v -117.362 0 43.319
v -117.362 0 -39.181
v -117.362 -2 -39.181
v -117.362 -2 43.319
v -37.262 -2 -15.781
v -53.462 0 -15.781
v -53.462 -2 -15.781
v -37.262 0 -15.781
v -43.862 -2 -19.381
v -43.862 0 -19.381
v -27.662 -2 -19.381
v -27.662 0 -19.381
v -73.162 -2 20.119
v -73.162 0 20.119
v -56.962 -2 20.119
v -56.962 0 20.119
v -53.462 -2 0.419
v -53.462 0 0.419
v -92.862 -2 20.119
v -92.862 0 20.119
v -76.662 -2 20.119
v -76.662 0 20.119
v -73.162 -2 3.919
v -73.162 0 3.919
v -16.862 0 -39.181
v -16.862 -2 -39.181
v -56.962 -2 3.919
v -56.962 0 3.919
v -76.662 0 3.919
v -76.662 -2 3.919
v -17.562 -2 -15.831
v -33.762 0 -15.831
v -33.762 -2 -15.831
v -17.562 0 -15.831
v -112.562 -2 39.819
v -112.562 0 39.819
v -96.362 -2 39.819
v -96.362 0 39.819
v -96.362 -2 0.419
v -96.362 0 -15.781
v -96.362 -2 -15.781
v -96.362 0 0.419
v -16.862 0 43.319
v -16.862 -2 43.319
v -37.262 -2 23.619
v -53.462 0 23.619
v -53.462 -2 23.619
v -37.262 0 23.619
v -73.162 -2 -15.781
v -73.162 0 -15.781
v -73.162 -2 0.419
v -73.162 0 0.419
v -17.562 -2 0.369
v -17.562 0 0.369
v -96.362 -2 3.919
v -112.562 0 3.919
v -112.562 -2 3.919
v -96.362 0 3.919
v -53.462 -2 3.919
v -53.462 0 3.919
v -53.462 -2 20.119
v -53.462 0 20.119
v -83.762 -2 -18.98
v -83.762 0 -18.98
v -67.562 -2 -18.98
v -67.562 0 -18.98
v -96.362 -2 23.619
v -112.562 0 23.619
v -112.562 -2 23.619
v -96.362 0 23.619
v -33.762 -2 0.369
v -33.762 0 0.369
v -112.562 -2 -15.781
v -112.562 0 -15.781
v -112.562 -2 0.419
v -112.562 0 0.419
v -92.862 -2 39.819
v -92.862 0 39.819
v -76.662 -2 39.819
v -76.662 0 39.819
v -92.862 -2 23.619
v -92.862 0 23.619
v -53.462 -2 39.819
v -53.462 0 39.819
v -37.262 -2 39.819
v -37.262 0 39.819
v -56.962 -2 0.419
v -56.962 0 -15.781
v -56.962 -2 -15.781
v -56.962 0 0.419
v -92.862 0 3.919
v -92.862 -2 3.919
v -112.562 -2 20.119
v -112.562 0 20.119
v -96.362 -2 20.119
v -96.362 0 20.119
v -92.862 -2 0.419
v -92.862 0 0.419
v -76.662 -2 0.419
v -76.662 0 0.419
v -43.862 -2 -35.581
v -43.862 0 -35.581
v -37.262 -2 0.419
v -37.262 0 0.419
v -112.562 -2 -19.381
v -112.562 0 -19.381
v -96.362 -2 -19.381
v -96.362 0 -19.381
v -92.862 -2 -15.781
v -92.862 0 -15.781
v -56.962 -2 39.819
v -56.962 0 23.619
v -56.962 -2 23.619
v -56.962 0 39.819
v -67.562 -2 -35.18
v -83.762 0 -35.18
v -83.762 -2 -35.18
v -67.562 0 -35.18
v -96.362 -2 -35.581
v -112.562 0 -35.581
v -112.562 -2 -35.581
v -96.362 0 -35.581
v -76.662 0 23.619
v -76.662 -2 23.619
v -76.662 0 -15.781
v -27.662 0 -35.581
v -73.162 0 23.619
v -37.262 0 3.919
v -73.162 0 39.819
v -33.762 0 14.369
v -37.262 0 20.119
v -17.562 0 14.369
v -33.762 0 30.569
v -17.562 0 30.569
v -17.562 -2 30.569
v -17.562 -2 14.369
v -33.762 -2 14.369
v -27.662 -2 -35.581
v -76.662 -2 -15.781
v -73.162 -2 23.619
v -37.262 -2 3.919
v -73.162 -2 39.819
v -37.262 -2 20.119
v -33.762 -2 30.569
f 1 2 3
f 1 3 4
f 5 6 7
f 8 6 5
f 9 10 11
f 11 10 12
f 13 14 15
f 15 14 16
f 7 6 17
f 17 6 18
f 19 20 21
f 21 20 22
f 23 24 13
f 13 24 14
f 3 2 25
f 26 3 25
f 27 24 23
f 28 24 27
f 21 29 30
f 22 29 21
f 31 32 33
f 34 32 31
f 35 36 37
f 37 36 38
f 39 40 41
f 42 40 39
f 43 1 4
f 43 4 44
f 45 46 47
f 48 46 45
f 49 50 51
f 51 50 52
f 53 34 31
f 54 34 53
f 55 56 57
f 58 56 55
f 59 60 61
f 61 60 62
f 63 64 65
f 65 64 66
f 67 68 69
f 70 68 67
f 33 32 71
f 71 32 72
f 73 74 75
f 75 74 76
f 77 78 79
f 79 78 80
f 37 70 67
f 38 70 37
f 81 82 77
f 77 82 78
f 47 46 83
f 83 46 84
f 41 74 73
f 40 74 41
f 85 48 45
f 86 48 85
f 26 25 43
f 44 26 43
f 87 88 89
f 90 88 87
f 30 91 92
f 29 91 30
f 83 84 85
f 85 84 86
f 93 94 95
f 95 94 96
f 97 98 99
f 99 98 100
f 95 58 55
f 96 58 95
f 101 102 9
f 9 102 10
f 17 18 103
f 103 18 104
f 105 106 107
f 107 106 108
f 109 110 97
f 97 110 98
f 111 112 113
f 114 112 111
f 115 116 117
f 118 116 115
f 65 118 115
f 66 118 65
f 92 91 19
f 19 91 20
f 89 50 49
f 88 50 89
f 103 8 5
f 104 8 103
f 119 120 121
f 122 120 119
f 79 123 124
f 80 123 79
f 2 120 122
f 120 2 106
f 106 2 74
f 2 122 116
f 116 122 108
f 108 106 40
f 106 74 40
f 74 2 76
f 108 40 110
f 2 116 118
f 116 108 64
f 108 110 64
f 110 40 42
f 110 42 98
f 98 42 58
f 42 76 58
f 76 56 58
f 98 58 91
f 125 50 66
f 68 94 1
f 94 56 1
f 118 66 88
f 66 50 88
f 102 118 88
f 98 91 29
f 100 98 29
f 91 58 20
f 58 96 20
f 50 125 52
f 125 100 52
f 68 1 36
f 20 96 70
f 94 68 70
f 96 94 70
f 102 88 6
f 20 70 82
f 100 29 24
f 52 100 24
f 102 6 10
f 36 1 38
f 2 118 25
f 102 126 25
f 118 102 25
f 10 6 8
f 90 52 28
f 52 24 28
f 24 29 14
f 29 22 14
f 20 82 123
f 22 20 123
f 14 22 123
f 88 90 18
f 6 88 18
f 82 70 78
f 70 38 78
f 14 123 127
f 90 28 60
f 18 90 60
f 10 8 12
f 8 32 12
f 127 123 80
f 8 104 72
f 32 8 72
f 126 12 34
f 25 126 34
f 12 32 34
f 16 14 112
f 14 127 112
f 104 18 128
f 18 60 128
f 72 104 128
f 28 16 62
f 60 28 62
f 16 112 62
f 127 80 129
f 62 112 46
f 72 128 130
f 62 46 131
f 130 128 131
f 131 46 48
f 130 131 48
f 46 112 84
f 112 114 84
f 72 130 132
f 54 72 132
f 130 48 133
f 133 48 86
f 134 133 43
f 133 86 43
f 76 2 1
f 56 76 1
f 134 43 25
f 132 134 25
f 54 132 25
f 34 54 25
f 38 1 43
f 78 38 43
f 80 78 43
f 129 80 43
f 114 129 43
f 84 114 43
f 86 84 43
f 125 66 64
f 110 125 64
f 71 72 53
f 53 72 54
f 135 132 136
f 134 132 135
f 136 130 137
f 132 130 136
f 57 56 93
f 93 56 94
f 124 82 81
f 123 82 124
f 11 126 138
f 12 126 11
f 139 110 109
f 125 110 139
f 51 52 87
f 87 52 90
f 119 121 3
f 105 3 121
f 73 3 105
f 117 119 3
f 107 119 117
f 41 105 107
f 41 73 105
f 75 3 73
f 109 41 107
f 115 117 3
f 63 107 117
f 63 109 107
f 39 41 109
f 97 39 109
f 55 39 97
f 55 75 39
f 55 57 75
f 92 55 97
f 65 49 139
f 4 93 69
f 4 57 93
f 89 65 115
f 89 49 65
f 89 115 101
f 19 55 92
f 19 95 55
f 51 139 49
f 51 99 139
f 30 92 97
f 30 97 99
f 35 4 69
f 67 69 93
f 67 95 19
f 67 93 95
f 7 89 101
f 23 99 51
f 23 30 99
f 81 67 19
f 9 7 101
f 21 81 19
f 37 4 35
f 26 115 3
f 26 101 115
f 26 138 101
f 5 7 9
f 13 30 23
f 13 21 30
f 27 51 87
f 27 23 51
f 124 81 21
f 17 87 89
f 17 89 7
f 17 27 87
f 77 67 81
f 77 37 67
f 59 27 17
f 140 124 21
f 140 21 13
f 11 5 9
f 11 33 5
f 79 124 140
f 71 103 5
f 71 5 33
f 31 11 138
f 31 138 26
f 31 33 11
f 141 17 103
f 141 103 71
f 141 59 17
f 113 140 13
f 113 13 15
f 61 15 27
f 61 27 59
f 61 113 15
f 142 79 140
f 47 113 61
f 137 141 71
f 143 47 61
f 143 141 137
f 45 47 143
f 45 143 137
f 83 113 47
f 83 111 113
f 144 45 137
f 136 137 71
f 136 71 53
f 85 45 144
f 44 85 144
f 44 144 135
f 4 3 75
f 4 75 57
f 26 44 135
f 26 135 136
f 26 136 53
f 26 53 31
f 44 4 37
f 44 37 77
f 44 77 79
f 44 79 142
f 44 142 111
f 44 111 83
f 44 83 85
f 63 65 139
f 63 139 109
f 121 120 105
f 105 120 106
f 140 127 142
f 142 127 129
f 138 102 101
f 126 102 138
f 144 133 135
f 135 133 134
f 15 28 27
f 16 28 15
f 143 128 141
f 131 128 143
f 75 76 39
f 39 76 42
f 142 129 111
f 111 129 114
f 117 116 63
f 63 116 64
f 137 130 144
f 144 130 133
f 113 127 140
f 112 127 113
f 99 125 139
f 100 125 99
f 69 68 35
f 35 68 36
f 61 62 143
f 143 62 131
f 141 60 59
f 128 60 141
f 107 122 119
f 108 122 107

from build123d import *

# Parameters (mm, degrees)
F0_W     = 100.5
F0_H     = 82.5
F1_DEPTH = 2
F2_W     = 16.2
F2_H     = 16.2
F3_DEPTH = 25


with BuildPart() as f1:
    # F0 (on Front) → F1 (new body)
    with BuildSketch(Plane.XZ):
        with Locations((-67.112431, 2.068522)):
            Rectangle(F0_W, F0_H)
    extrude(amount=F1_DEPTH)

    # F2 (on Front) → F3 (cut)
    with BuildSketch(Plane.XZ):
        with Locations((-104.462431, 31.718522)):
            Rectangle(F2_W, F2_H)
        with Locations((-104.462431, 12.018522)):
            Rectangle(F2_W, F2_H)
        with Locations((-104.462431, -7.681478)):
            Rectangle(F2_W, F2_H)
        with Locations((-104.462431, -27.481478)):
            Rectangle(F2_W, F2_H)
        with Locations((-84.762431, 31.718522)):
            Rectangle(F2_W, F2_H)
        with Locations((-84.762431, 12.018522)):
            Rectangle(F2_W, F2_H)
        with Locations((-84.762431, -7.681478)):
            Rectangle(F2_W, F2_H)
        with Locations((-65.062431, 31.718522)):
            Rectangle(F2_W, F2_H)
        with Locations((-65.062431, 12.018522)):
            Rectangle(F2_W, F2_H)
        with Locations((-65.062431, -7.681478)):
            Rectangle(F2_W, F2_H)
        with Locations((-45.362431, 31.718522)):
            Rectangle(F2_W, F2_H)
        with Locations((-45.362431, 12.018522)):
            Rectangle(F2_W, F2_H)
        with Locations((-45.362431, -7.681478)):
            Rectangle(F2_W, F2_H)
        with Locations((-75.662431, -27.079934)):
            Rectangle(F2_W, F2_H)
        with Locations((-35.762431, -27.481478)):
            Rectangle(F2_W, F2_H)
        with Locations((-25.662431, -7.731478)):
            Rectangle(F2_W, F2_H)
        with Locations((-25.662431, 22.468522)):
            Rectangle(F2_W, F2_H)
    extrude(amount=F3_DEPTH, mode=Mode.SUBTRACT)


solid = f1.part
